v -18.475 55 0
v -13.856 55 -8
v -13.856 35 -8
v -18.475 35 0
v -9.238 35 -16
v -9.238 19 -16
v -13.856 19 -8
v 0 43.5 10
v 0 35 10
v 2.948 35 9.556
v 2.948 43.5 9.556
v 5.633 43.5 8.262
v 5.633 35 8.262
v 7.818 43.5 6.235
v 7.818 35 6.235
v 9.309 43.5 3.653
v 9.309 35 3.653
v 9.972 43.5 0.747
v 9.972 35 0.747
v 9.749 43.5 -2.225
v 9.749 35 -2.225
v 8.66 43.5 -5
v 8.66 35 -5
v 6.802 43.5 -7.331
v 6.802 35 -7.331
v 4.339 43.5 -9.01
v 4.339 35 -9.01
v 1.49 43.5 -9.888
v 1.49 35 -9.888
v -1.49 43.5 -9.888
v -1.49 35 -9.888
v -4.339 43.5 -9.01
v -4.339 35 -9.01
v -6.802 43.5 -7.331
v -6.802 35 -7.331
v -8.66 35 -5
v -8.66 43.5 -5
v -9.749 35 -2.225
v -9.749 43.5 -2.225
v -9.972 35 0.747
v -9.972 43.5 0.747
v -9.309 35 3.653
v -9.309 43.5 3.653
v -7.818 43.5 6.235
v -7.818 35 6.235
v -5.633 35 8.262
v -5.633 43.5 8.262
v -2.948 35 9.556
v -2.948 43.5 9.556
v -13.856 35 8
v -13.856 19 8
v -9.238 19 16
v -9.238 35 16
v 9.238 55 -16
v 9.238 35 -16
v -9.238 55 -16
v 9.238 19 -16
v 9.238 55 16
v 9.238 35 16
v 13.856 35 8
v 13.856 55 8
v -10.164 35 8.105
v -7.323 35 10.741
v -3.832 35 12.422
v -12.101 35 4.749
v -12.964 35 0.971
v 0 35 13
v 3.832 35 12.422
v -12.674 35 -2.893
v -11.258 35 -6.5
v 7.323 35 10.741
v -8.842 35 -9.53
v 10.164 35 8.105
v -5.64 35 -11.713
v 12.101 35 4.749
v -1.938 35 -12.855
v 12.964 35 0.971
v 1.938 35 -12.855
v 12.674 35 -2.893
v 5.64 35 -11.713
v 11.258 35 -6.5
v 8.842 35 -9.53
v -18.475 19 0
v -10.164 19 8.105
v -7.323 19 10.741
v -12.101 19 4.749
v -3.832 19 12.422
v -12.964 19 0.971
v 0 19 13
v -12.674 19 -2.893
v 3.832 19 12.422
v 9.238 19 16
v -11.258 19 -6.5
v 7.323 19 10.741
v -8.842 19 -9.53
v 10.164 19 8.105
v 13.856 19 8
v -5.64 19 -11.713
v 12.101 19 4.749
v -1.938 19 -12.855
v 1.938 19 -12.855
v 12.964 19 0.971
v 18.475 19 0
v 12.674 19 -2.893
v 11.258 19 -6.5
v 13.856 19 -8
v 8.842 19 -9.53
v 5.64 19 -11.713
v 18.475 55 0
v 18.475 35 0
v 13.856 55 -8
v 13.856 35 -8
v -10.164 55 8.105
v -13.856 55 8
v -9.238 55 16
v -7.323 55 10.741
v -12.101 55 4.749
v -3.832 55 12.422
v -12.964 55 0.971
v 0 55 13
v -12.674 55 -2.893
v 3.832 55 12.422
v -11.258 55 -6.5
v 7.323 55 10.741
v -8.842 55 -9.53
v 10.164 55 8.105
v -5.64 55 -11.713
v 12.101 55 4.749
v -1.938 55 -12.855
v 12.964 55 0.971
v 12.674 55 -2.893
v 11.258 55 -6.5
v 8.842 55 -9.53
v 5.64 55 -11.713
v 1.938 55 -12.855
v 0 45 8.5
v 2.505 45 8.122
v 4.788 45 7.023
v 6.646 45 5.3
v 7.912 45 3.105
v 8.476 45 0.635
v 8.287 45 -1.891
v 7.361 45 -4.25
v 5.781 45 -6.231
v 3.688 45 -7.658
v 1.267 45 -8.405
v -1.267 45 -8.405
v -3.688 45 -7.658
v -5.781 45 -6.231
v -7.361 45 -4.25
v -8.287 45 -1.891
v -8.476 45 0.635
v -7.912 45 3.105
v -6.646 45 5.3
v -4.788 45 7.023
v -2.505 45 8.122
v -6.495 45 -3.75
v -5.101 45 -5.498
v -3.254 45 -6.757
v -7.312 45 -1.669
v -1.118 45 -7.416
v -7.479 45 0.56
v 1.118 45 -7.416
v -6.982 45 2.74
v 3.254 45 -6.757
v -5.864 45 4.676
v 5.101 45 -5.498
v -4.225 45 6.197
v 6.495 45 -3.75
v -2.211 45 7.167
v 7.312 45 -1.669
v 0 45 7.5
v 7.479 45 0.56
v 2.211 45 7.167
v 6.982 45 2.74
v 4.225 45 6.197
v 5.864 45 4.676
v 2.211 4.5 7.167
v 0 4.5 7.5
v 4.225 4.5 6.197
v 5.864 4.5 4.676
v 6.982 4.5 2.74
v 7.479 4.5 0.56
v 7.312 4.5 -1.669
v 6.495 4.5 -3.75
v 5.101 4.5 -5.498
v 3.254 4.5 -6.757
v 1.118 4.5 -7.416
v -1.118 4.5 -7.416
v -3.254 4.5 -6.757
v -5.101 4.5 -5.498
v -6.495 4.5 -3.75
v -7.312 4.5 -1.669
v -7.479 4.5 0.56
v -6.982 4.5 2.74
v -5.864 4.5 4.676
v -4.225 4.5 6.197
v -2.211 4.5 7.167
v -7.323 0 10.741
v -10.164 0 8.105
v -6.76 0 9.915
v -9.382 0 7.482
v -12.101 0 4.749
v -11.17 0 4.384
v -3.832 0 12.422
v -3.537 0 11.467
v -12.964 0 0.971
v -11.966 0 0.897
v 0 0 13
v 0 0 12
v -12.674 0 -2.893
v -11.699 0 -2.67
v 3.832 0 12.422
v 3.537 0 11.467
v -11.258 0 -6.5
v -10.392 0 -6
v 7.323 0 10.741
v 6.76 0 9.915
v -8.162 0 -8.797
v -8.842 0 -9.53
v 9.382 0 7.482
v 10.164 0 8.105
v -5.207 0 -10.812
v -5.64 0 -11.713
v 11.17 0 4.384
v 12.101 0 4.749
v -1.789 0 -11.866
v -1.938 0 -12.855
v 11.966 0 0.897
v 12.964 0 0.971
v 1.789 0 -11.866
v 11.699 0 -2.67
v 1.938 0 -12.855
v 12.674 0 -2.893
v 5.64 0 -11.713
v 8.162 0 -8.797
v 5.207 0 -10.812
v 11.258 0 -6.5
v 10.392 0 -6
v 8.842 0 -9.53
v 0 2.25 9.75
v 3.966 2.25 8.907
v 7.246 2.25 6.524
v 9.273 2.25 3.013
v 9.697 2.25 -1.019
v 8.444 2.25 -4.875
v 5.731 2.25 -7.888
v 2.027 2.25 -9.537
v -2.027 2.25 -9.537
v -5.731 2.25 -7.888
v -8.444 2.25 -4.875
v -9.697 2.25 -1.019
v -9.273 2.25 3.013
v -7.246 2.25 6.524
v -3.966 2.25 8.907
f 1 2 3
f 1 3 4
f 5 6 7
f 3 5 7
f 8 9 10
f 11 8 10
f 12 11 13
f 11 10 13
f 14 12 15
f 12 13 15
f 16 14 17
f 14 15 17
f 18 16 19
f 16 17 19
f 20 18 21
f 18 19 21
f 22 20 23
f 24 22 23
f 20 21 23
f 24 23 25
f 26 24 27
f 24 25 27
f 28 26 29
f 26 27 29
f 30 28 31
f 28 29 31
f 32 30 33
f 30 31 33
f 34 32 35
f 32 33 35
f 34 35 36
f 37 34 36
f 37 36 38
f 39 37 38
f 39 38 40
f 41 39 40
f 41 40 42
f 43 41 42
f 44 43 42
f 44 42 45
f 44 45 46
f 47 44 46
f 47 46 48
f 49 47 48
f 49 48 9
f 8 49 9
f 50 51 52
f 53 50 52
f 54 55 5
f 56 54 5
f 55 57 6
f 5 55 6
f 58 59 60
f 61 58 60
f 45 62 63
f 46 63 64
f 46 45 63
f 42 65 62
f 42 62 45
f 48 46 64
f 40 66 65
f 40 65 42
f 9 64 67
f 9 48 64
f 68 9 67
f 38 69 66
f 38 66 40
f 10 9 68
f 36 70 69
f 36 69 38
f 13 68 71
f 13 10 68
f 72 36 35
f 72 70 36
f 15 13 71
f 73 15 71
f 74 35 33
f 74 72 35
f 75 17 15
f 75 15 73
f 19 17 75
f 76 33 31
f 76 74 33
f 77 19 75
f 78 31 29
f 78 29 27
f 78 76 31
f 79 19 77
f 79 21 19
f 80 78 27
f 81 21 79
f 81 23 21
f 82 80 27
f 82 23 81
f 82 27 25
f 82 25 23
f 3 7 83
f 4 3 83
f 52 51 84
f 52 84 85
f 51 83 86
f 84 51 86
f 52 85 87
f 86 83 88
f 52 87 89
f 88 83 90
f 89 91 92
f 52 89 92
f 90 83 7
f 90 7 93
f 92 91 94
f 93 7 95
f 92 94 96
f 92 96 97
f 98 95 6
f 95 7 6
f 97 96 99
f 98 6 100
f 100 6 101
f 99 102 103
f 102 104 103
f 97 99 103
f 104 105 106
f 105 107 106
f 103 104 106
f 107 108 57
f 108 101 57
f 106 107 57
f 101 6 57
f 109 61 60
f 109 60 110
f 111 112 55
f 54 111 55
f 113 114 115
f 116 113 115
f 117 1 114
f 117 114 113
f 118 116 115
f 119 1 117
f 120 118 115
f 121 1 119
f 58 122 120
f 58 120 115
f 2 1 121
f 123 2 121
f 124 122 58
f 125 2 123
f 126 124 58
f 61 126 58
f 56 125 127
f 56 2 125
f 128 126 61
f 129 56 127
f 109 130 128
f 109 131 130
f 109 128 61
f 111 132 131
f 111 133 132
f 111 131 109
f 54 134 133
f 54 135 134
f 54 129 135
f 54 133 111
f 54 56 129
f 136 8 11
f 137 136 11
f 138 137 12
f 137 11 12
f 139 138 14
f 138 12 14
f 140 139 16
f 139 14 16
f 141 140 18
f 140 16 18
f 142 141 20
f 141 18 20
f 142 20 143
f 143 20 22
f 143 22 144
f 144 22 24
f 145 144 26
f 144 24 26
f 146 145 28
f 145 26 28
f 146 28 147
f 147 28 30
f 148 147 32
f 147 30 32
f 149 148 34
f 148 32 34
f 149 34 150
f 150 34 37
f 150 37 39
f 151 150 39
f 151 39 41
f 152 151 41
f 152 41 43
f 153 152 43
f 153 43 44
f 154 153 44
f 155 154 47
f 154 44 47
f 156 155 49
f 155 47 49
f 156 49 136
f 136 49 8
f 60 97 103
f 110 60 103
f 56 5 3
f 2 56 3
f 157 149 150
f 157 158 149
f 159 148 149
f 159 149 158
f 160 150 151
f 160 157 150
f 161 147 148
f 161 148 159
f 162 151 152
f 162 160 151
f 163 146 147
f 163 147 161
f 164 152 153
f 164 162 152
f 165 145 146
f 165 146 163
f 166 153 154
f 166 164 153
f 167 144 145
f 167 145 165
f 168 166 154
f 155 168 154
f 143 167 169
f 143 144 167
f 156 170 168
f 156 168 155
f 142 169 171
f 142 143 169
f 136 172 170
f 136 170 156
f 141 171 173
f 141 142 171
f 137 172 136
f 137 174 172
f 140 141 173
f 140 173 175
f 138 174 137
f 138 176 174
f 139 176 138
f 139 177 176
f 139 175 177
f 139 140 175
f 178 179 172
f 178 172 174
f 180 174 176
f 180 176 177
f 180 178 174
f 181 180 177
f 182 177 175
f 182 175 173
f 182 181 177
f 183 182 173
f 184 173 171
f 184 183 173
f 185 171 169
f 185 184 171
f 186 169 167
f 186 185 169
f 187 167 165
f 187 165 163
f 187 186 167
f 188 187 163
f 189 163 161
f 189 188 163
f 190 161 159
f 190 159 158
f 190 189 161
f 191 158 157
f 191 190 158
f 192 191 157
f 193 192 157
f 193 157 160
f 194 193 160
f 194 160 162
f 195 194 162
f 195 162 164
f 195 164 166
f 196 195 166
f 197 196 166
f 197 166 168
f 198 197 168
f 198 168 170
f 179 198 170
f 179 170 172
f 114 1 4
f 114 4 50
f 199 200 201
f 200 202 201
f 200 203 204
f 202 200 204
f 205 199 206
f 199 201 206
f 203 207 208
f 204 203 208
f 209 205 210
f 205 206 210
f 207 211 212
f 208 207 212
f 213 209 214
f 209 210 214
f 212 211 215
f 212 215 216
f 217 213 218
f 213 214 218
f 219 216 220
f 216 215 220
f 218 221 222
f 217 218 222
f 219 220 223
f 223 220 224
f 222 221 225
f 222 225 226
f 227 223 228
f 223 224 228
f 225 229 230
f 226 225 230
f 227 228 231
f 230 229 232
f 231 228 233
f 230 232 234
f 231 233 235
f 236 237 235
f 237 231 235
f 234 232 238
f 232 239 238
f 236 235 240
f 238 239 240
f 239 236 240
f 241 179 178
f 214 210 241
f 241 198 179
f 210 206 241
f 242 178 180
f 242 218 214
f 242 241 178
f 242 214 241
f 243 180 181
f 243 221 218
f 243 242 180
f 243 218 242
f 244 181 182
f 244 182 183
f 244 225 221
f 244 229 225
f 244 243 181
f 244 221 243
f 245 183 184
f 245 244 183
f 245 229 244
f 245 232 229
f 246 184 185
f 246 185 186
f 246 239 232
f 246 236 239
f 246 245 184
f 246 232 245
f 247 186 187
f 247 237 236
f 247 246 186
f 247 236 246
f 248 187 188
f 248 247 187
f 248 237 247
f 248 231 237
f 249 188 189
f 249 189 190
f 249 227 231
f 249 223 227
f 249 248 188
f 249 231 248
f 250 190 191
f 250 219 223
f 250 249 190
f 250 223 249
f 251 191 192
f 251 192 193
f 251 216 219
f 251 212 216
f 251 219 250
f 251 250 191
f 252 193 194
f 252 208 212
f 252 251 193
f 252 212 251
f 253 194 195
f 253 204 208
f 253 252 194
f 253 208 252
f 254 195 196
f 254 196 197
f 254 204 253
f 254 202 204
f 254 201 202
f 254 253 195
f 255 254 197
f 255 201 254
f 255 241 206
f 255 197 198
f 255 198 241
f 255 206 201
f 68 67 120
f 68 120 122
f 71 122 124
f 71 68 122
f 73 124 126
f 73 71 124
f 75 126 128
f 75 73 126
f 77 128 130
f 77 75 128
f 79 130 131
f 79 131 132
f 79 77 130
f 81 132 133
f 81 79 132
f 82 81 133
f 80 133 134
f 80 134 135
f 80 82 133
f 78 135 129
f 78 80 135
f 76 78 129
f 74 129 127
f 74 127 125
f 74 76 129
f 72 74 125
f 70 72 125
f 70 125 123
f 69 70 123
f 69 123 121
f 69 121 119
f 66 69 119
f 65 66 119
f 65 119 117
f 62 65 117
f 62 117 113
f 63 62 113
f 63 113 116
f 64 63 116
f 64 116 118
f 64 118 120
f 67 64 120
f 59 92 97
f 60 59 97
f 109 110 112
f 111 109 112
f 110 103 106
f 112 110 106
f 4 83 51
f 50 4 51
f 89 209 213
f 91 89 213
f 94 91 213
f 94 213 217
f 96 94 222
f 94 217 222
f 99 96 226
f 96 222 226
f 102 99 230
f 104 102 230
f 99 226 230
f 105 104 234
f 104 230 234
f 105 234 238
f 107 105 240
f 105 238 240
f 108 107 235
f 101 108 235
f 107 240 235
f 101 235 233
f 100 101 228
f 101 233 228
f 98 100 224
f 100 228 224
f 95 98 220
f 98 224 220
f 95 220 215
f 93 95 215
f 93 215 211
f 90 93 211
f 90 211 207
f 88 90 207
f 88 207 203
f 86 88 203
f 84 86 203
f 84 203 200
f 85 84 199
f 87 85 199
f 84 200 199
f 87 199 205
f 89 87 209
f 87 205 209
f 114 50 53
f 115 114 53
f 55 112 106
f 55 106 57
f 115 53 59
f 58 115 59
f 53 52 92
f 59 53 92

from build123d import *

# Parameters (mm, degrees)
SZKIC1_R                    = 13
SZKIC1_R_2                  = 7.5
DODANIE_WYCI_GNI_CIE1_DEPTH = 19
SFAZOWANIE1_SIZE            = 4.5
DODANIE_WYCI_GNI_CIE2_START = 19
SZKIC1_3_R                  = 7.5
DODANIE_WYCI_GNI_CIE2_DEPTH = 16
DODANIE_WYCI_GNI_CIE3_START = 29
SZKIC2_R                    = 13
DODANIE_WYCI_GNI_CIE3_DEPTH = 26
DODANIE_WYCI_GNI_CIE4_START = 29
SZKIC2_3_R                  = 10
SZKIC2_3_R_2                = 7.5
DODANIE_WYCI_GNI_CIE4_DEPTH = 16
SFAZOWANIE2_SIZE            = 1.5


with BuildPart() as part:
    # Szkic1 → Dodanie-wyciągnięcie1 (new body)
    with BuildSketch(Plane(origin=(0, 0, 0), x_dir=(1, 0, 0), z_dir=(0, 1, 0))):
        Circle(SZKIC1_R)
        Circle(SZKIC1_R_2, mode=Mode.SUBTRACT)
    extrude(amount=DODANIE_WYCI_GNI_CIE1_DEPTH)

    # Sfazowanie1
    sfazowanie1_edges = [part.edges().sort_by_distance(p)[0] for p in [
        (-7.5, 0, 0),
    ]]
    chamfer(sfazowanie1_edges, length=SFAZOWANIE1_SIZE)

    # Szkic1<3> → Dodanie-wyciągnięcie2 (add)
    with BuildSketch(Plane(origin=(0, 0, 0), x_dir=(1, 0, 0), z_dir=(0, 1, 0)).offset(DODANIE_WYCI_GNI_CIE2_START)):
        Polygon((-18.475208614, 0), (-9.237604307, -16), (9.237604307, -16), (18.475208614, 0), (9.237604307, 16), (-9.237604307, 16), align=None)
        Circle(SZKIC1_3_R, mode=Mode.SUBTRACT)
    extrude(amount=DODANIE_WYCI_GNI_CIE2_DEPTH)

    # Szkic2 → Dodanie-wyciągnięcie3 (add)
    with BuildSketch(Plane(origin=(0, 0, 0), x_dir=(1, 0, 0), z_dir=(0, 1, 0)).offset(DODANIE_WYCI_GNI_CIE3_START)):
        Polygon((-9.237604307, 16), (-18.475208614, 0), (-9.237604307, -16), (9.237604307, -16), (18.475208614, 0), (9.237604307, 16), align=None)
        Circle(SZKIC2_R, mode=Mode.SUBTRACT)
    extrude(amount=DODANIE_WYCI_GNI_CIE3_DEPTH)

    # Szkic2<3> → Dodanie-wyciągnięcie4 (add)
    with BuildSketch(Plane(origin=(0, 0, 0), x_dir=(1, 0, 0), z_dir=(0, 1, 0)).offset(DODANIE_WYCI_GNI_CIE4_START)):
        Circle(SZKIC2_3_R)
        Circle(SZKIC2_3_R_2, mode=Mode.SUBTRACT)
    extrude(amount=DODANIE_WYCI_GNI_CIE4_DEPTH)

    # Sfazowanie2
    sfazowanie2_edges = [part.edges().sort_by_distance(p)[0] for p in [
        (-10, 45, 0),
    ]]
    chamfer(sfazowanie2_edges, length=SFAZOWANIE2_SIZE)


solid = part.part
